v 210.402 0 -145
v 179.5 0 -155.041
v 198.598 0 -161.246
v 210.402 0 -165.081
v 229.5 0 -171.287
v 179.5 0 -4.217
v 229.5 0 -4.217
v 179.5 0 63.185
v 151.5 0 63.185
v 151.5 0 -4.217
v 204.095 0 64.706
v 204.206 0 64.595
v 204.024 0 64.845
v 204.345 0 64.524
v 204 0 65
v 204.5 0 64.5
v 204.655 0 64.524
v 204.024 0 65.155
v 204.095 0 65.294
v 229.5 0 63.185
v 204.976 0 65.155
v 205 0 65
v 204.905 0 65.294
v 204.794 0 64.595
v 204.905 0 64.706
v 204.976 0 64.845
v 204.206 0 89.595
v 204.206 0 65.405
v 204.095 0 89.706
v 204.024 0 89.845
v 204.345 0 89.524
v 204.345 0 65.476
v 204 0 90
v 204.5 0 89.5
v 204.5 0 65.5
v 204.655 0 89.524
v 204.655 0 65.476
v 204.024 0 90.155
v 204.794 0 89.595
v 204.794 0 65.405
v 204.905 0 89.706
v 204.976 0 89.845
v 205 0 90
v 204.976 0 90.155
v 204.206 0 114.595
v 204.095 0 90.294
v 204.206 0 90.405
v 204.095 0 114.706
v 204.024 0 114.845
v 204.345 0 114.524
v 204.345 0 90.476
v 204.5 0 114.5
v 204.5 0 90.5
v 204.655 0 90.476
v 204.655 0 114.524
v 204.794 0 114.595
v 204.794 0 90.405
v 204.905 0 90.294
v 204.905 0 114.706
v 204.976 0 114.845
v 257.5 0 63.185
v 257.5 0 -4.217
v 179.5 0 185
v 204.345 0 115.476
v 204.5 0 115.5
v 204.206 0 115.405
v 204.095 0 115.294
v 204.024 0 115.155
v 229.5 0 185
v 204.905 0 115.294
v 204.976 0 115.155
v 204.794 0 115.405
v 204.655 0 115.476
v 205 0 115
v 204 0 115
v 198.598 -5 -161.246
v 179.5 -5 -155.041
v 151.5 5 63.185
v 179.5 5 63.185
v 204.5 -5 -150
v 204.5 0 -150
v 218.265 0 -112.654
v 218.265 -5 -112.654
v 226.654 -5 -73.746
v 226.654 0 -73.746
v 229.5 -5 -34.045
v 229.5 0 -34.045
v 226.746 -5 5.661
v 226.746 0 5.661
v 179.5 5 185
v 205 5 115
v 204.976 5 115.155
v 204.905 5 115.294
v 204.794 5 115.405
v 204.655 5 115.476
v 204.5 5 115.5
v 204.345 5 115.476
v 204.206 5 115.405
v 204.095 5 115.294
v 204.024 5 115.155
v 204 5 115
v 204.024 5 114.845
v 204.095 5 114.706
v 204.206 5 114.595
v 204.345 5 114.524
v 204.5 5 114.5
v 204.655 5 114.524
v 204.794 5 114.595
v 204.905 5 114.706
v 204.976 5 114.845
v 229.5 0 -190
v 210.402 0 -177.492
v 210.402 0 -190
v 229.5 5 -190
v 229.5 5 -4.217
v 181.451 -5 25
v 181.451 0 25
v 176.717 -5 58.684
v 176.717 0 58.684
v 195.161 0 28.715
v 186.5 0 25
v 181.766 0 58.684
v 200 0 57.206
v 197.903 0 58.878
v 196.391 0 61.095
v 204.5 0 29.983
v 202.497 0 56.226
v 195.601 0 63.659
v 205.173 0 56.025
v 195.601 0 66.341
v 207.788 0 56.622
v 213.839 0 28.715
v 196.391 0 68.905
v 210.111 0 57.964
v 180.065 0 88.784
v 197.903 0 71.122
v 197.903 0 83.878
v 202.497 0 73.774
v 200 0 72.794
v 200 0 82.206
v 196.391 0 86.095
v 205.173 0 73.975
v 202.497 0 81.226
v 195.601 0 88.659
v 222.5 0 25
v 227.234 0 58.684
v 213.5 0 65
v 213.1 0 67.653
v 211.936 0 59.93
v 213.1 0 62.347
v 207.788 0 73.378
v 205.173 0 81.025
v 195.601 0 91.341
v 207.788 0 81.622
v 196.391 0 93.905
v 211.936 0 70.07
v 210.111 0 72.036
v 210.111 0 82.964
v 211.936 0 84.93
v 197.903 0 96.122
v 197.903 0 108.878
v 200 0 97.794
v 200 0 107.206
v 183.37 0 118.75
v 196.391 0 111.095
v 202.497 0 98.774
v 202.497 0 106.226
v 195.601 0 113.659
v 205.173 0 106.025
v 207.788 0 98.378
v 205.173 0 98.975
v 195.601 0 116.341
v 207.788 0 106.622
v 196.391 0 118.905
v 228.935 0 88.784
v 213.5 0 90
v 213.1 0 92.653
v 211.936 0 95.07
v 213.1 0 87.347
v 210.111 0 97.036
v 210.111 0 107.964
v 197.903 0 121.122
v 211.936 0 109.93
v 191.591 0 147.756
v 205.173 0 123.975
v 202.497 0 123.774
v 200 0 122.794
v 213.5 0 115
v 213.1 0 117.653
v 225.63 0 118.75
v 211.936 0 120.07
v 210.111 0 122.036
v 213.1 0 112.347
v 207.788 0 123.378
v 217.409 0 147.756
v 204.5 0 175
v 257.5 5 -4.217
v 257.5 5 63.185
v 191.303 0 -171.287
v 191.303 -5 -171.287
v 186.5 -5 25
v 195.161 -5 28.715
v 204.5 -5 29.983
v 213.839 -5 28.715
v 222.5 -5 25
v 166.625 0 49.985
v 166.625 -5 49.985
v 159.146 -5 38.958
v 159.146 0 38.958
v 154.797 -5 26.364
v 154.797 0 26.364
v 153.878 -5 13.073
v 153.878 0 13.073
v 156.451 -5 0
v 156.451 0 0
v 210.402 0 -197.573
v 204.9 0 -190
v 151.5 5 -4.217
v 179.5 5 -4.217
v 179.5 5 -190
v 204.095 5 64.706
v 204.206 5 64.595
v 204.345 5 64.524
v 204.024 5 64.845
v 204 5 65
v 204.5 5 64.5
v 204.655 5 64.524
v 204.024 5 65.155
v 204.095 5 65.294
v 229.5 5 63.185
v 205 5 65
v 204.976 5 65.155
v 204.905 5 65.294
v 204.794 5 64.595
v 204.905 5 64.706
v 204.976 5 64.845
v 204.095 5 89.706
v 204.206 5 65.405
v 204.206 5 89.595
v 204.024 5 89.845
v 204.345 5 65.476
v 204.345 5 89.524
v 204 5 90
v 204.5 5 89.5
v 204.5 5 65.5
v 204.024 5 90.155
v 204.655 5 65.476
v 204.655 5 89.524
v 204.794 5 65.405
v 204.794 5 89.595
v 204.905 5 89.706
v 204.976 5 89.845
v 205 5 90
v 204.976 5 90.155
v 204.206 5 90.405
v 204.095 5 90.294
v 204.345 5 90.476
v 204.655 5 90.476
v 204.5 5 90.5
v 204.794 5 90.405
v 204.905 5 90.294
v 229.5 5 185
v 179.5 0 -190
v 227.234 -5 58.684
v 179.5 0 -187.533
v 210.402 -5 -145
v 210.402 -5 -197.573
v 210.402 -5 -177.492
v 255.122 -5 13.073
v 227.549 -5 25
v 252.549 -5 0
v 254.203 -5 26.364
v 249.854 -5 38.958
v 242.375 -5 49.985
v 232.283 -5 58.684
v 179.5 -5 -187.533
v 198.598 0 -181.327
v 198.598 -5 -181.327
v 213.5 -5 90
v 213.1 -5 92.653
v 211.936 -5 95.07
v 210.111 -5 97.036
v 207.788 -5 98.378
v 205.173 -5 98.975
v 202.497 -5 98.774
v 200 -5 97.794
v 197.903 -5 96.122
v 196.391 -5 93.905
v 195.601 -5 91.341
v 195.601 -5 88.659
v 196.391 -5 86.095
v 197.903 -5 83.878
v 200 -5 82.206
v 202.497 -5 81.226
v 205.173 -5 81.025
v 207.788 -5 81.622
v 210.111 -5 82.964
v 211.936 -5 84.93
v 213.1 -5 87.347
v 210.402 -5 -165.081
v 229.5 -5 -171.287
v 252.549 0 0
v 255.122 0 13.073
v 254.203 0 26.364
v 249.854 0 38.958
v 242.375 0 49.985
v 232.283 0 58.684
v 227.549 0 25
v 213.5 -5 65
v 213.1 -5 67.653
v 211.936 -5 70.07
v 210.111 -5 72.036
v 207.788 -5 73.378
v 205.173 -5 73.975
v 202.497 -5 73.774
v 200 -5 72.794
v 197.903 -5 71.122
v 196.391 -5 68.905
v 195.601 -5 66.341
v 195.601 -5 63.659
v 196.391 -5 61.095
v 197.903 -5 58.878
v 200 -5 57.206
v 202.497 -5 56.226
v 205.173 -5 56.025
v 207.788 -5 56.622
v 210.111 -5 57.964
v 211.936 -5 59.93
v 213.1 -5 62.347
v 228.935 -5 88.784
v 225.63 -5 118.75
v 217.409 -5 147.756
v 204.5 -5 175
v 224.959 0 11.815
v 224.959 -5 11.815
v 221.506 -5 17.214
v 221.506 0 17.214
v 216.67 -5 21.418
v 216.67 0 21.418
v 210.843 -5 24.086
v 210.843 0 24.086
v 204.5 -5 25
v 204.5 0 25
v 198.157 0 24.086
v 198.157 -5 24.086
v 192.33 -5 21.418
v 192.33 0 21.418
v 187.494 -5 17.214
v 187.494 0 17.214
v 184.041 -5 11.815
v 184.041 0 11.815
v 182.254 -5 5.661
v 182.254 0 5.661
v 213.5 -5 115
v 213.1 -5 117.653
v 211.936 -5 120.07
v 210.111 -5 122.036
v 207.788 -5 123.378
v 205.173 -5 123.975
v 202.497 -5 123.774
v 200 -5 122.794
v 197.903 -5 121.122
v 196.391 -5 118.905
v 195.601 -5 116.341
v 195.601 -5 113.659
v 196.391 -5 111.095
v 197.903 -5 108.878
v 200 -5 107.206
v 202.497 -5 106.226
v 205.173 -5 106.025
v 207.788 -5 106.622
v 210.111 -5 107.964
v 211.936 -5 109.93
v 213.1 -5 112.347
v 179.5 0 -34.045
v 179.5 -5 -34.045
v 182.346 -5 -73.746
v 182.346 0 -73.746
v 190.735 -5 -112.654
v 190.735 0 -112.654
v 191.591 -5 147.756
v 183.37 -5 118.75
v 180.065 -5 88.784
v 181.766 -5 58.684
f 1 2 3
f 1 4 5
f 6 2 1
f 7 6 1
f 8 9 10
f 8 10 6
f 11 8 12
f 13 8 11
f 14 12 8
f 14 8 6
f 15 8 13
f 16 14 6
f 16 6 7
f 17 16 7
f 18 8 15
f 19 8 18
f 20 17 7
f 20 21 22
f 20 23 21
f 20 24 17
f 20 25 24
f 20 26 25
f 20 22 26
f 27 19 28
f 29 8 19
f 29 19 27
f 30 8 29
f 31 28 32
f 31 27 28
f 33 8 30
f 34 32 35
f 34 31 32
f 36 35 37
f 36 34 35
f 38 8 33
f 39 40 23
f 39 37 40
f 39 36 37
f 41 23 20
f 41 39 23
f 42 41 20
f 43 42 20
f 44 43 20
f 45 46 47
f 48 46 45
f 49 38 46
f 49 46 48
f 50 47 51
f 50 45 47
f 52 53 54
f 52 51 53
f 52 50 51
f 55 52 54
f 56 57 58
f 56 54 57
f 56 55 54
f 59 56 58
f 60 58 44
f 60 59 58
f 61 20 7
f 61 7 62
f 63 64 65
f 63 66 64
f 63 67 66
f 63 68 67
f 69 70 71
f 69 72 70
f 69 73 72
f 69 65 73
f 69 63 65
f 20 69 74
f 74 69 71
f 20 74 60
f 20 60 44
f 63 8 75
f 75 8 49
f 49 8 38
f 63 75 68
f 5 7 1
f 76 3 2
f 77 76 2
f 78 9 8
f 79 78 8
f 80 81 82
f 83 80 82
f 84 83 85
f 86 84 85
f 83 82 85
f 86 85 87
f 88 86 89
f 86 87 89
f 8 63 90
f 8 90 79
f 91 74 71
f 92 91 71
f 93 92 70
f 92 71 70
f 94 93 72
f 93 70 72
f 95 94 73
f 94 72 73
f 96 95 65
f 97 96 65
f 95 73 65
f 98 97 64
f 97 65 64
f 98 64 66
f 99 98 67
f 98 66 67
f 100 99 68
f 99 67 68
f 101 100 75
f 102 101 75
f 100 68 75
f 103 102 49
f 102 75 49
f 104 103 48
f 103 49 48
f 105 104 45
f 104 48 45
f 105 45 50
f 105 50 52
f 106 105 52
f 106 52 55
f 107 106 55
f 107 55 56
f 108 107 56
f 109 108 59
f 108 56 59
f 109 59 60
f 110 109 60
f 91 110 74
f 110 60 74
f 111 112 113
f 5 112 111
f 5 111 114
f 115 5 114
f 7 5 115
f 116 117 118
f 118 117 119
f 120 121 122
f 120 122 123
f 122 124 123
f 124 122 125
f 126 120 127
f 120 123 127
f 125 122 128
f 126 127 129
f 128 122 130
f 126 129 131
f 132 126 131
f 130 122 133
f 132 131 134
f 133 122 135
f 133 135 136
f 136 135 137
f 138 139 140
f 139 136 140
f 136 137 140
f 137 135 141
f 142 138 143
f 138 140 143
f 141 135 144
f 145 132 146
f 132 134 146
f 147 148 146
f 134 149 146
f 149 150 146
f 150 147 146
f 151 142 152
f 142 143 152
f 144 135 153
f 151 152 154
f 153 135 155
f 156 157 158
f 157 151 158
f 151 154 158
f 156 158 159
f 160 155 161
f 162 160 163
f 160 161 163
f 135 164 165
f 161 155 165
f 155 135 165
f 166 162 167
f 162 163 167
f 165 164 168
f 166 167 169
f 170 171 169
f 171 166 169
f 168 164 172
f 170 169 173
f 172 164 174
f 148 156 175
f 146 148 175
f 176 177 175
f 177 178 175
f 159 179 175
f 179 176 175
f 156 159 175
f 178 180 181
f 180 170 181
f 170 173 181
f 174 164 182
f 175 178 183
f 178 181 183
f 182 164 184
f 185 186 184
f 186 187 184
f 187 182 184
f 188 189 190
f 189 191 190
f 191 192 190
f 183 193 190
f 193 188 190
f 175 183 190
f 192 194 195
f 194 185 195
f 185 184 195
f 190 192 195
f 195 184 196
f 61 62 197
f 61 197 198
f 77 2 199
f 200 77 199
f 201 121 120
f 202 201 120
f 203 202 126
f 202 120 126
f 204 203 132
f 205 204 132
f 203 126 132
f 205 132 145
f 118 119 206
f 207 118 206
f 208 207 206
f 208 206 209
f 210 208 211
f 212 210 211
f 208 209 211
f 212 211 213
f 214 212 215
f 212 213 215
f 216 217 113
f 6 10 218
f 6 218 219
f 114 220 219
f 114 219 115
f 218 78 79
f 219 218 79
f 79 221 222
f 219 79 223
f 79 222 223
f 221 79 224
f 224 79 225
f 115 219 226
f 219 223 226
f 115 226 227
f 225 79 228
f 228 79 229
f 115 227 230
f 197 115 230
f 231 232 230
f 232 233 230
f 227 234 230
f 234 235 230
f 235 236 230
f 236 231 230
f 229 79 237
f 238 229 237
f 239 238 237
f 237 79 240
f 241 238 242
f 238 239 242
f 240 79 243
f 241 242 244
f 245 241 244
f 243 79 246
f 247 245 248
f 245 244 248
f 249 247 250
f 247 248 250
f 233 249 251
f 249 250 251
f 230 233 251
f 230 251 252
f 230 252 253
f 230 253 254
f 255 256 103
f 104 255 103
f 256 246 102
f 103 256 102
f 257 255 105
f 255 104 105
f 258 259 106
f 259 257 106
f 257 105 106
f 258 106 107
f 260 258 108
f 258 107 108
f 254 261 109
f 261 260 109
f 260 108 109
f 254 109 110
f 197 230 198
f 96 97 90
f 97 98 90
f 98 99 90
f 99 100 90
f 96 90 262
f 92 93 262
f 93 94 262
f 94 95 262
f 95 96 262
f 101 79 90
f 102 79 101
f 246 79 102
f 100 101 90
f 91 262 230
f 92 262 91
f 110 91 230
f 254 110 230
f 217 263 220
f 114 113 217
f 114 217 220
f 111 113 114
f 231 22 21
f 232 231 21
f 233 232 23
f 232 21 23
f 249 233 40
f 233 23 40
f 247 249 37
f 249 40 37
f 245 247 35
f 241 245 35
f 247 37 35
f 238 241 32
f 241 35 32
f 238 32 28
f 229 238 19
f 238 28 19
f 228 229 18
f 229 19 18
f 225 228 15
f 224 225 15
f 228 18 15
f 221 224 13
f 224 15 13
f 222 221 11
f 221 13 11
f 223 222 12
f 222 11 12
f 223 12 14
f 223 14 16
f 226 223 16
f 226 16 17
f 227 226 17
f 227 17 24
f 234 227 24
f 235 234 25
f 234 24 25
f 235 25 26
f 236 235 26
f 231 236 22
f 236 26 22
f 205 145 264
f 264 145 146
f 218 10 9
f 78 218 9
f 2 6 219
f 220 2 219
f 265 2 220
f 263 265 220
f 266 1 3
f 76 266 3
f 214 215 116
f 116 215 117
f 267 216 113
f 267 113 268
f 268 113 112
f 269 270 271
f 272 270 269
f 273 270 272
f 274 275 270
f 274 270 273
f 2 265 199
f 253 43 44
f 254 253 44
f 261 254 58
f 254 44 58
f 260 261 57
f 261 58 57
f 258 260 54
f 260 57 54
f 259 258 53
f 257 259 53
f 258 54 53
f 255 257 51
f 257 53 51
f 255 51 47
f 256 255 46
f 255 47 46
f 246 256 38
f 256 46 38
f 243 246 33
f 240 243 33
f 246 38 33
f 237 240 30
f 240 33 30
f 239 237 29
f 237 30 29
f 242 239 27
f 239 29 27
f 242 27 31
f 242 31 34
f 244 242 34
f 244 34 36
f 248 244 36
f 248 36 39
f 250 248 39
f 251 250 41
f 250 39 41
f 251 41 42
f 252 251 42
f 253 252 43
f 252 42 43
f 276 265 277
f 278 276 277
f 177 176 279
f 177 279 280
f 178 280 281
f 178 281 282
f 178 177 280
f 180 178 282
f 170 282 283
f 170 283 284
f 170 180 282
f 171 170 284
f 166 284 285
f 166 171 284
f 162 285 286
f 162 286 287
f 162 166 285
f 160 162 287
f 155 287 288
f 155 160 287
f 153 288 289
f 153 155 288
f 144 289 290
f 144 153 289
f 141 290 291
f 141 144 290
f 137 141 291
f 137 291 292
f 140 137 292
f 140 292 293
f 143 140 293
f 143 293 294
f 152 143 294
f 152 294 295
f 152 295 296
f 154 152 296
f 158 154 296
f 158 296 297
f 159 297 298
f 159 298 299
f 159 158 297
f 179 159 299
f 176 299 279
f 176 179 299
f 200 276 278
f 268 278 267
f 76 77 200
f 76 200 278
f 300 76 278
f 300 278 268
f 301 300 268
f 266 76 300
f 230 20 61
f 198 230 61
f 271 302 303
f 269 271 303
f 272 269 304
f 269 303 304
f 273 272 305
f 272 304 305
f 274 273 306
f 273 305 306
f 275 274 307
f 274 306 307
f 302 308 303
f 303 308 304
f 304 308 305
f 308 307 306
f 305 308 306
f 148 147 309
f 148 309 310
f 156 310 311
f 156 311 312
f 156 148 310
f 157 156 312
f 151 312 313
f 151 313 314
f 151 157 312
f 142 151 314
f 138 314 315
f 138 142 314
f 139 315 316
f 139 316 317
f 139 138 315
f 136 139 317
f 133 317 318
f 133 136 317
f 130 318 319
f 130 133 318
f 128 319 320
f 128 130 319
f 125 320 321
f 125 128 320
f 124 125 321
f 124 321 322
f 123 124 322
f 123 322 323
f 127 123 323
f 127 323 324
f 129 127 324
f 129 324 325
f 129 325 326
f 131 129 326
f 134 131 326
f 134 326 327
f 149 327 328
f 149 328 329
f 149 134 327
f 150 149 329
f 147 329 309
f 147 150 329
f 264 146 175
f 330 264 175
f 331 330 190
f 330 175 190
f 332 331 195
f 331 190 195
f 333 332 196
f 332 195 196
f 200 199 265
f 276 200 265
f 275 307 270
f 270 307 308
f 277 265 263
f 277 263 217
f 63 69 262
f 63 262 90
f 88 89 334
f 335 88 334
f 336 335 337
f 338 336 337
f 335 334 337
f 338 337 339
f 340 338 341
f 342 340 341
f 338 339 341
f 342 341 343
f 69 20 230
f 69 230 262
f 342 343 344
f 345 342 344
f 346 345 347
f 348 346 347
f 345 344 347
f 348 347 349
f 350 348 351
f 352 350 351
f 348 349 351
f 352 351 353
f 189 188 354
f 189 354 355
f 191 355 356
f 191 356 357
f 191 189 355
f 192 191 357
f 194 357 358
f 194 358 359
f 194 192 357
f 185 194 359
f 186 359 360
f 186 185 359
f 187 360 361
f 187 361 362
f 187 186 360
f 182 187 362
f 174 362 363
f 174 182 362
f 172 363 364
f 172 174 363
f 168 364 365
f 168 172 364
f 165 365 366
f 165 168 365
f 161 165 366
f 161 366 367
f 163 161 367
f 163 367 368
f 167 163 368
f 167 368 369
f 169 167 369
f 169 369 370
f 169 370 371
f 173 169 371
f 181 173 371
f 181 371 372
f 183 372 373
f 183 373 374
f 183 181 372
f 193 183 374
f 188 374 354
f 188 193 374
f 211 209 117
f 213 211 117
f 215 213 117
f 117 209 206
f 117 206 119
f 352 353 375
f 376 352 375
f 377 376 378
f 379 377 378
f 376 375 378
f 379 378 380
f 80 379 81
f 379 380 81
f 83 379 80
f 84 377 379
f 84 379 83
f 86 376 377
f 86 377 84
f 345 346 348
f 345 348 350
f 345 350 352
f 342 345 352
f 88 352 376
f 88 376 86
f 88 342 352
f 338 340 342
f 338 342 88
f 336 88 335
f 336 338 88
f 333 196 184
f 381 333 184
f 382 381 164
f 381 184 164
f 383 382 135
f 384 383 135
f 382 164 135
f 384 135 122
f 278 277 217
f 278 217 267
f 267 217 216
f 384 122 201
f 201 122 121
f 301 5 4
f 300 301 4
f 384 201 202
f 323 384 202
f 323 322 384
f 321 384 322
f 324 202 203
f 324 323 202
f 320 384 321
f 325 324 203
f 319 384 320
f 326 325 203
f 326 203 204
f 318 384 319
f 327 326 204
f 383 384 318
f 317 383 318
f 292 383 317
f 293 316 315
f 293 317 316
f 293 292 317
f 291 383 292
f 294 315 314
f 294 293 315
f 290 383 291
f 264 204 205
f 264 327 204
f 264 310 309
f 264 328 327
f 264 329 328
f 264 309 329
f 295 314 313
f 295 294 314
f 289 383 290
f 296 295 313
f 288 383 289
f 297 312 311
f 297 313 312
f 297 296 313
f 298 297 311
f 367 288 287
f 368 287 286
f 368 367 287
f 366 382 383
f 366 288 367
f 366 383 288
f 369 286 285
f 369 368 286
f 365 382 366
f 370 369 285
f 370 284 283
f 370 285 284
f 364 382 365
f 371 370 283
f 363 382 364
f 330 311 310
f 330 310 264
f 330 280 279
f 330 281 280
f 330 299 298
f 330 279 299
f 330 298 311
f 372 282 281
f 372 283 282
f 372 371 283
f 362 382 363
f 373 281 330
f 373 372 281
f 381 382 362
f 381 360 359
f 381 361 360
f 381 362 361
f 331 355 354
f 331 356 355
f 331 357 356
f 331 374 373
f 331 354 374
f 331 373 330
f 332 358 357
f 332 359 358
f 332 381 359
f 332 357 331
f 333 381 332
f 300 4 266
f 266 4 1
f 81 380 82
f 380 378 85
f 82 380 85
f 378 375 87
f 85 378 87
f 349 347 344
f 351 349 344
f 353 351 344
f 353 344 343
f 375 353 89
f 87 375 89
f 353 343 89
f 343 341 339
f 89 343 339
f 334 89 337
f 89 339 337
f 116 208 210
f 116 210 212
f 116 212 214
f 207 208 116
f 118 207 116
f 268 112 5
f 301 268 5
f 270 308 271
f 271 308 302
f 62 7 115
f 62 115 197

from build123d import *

# Parameters (mm, degrees)
F0_R     = 9
F1_DEPTH = 5
F2_R     = 0.5
F2_W     = 28
F2_H     = 67.402362
F3_DEPTH = 5
F5_DEPTH = 5


with BuildPart() as f1:
    # F0 (on Front) → F1 (new body)
    with BuildSketch(Plane.XZ):
        with BuildLine():
            ThreePointArc((186.5, 25), (204.5, 29.983338), (222.5, 25))
            Line((222.5, 25), (227.23391, 58.68352))
            ThreePointArc((227.23391, 58.68352), (225.63008, 118.749951), (204.5, 175))
            ThreePointArc((204.5, 175), (183.36992, 118.749951), (181.76609, 58.68352))
            Line((181.76609, 58.68352), (186.5, 25))
        make_face()
        with Locations((204.5, 65)):
            Circle(F0_R, mode=Mode.SUBTRACT)
        with Locations((204.5, 90)):
            Circle(F0_R, mode=Mode.SUBTRACT)
        with Locations((204.5, 115)):
            Circle(F0_R, mode=Mode.SUBTRACT)
        with BuildLine():
            Line((232.283048, 58.68352), (227.549138, 25))
            Line((227.549138, 25), (252.549138, 0))
            ThreePointArc((252.549138, 0), (252.443394, 32.804643), (232.283048, 58.68352))
        make_face()
        with BuildLine():
            ThreePointArc((204.5, -150), (226.654024, -73.745748), (226.746456, 5.661451))
            ThreePointArc((226.746456, 5.661451), (219.238422, 19.48953), (204.5, 25))
            ThreePointArc((204.5, 25), (189.761578, 19.48953), (182.253544, 5.661451))
            ThreePointArc((182.253544, 5.661451), (182.345976, -73.745748), (204.5, -150))
        make_face()
        with BuildLine():
            Line((156.450862, 0), (181.450862, 25))
            Line((181.450862, 25), (176.716952, 58.68352))
            ThreePointArc((176.716952, 58.68352), (156.556606, 32.804643), (156.450862, 0))
        make_face()
    extrude(amount=F1_DEPTH)


with BuildPart() as f3:
    # F2 (on Front) → F3 (new body)
    with BuildSketch(Plane.XZ):
        Polygon((229.5, 185), (179.5, 185), (179.5, 63.185245), (179.5, -4.217117), (179.5, -190), (229.5, -190), (229.5, -4.217117), (229.5, 63.185245), align=None)
        with Locations((204.5, 65)):
            Circle(F2_R, mode=Mode.SUBTRACT)
        with Locations((204.5, 90)):
            Circle(F2_R, mode=Mode.SUBTRACT)
        with Locations((204.5, 115)):
            Circle(F2_R, mode=Mode.SUBTRACT)
        with Locations((165.5, 29.484064)):
            Rectangle(F2_W, F2_H)
        with Locations((243.5, 29.484064)):
            Rectangle(F2_W, F2_H)
    extrude(amount=-F3_DEPTH)

    # F4 (on Front) → F5 (join)
    with BuildSketch(Plane.XZ):
        Polygon((198.598301, -161.245985), (179.5, -155.040571), (191.303399, -171.286556), (179.5, -187.53254), (198.598301, -181.327126), (210.401699, -197.573111), (210.401699, -177.49197), (229.5, -171.286556), (210.401699, -165.081142), (210.401699, -145), align=None)
    extrude(amount=F5_DEPTH)


solid = Compound([f1.part, f3.part])
